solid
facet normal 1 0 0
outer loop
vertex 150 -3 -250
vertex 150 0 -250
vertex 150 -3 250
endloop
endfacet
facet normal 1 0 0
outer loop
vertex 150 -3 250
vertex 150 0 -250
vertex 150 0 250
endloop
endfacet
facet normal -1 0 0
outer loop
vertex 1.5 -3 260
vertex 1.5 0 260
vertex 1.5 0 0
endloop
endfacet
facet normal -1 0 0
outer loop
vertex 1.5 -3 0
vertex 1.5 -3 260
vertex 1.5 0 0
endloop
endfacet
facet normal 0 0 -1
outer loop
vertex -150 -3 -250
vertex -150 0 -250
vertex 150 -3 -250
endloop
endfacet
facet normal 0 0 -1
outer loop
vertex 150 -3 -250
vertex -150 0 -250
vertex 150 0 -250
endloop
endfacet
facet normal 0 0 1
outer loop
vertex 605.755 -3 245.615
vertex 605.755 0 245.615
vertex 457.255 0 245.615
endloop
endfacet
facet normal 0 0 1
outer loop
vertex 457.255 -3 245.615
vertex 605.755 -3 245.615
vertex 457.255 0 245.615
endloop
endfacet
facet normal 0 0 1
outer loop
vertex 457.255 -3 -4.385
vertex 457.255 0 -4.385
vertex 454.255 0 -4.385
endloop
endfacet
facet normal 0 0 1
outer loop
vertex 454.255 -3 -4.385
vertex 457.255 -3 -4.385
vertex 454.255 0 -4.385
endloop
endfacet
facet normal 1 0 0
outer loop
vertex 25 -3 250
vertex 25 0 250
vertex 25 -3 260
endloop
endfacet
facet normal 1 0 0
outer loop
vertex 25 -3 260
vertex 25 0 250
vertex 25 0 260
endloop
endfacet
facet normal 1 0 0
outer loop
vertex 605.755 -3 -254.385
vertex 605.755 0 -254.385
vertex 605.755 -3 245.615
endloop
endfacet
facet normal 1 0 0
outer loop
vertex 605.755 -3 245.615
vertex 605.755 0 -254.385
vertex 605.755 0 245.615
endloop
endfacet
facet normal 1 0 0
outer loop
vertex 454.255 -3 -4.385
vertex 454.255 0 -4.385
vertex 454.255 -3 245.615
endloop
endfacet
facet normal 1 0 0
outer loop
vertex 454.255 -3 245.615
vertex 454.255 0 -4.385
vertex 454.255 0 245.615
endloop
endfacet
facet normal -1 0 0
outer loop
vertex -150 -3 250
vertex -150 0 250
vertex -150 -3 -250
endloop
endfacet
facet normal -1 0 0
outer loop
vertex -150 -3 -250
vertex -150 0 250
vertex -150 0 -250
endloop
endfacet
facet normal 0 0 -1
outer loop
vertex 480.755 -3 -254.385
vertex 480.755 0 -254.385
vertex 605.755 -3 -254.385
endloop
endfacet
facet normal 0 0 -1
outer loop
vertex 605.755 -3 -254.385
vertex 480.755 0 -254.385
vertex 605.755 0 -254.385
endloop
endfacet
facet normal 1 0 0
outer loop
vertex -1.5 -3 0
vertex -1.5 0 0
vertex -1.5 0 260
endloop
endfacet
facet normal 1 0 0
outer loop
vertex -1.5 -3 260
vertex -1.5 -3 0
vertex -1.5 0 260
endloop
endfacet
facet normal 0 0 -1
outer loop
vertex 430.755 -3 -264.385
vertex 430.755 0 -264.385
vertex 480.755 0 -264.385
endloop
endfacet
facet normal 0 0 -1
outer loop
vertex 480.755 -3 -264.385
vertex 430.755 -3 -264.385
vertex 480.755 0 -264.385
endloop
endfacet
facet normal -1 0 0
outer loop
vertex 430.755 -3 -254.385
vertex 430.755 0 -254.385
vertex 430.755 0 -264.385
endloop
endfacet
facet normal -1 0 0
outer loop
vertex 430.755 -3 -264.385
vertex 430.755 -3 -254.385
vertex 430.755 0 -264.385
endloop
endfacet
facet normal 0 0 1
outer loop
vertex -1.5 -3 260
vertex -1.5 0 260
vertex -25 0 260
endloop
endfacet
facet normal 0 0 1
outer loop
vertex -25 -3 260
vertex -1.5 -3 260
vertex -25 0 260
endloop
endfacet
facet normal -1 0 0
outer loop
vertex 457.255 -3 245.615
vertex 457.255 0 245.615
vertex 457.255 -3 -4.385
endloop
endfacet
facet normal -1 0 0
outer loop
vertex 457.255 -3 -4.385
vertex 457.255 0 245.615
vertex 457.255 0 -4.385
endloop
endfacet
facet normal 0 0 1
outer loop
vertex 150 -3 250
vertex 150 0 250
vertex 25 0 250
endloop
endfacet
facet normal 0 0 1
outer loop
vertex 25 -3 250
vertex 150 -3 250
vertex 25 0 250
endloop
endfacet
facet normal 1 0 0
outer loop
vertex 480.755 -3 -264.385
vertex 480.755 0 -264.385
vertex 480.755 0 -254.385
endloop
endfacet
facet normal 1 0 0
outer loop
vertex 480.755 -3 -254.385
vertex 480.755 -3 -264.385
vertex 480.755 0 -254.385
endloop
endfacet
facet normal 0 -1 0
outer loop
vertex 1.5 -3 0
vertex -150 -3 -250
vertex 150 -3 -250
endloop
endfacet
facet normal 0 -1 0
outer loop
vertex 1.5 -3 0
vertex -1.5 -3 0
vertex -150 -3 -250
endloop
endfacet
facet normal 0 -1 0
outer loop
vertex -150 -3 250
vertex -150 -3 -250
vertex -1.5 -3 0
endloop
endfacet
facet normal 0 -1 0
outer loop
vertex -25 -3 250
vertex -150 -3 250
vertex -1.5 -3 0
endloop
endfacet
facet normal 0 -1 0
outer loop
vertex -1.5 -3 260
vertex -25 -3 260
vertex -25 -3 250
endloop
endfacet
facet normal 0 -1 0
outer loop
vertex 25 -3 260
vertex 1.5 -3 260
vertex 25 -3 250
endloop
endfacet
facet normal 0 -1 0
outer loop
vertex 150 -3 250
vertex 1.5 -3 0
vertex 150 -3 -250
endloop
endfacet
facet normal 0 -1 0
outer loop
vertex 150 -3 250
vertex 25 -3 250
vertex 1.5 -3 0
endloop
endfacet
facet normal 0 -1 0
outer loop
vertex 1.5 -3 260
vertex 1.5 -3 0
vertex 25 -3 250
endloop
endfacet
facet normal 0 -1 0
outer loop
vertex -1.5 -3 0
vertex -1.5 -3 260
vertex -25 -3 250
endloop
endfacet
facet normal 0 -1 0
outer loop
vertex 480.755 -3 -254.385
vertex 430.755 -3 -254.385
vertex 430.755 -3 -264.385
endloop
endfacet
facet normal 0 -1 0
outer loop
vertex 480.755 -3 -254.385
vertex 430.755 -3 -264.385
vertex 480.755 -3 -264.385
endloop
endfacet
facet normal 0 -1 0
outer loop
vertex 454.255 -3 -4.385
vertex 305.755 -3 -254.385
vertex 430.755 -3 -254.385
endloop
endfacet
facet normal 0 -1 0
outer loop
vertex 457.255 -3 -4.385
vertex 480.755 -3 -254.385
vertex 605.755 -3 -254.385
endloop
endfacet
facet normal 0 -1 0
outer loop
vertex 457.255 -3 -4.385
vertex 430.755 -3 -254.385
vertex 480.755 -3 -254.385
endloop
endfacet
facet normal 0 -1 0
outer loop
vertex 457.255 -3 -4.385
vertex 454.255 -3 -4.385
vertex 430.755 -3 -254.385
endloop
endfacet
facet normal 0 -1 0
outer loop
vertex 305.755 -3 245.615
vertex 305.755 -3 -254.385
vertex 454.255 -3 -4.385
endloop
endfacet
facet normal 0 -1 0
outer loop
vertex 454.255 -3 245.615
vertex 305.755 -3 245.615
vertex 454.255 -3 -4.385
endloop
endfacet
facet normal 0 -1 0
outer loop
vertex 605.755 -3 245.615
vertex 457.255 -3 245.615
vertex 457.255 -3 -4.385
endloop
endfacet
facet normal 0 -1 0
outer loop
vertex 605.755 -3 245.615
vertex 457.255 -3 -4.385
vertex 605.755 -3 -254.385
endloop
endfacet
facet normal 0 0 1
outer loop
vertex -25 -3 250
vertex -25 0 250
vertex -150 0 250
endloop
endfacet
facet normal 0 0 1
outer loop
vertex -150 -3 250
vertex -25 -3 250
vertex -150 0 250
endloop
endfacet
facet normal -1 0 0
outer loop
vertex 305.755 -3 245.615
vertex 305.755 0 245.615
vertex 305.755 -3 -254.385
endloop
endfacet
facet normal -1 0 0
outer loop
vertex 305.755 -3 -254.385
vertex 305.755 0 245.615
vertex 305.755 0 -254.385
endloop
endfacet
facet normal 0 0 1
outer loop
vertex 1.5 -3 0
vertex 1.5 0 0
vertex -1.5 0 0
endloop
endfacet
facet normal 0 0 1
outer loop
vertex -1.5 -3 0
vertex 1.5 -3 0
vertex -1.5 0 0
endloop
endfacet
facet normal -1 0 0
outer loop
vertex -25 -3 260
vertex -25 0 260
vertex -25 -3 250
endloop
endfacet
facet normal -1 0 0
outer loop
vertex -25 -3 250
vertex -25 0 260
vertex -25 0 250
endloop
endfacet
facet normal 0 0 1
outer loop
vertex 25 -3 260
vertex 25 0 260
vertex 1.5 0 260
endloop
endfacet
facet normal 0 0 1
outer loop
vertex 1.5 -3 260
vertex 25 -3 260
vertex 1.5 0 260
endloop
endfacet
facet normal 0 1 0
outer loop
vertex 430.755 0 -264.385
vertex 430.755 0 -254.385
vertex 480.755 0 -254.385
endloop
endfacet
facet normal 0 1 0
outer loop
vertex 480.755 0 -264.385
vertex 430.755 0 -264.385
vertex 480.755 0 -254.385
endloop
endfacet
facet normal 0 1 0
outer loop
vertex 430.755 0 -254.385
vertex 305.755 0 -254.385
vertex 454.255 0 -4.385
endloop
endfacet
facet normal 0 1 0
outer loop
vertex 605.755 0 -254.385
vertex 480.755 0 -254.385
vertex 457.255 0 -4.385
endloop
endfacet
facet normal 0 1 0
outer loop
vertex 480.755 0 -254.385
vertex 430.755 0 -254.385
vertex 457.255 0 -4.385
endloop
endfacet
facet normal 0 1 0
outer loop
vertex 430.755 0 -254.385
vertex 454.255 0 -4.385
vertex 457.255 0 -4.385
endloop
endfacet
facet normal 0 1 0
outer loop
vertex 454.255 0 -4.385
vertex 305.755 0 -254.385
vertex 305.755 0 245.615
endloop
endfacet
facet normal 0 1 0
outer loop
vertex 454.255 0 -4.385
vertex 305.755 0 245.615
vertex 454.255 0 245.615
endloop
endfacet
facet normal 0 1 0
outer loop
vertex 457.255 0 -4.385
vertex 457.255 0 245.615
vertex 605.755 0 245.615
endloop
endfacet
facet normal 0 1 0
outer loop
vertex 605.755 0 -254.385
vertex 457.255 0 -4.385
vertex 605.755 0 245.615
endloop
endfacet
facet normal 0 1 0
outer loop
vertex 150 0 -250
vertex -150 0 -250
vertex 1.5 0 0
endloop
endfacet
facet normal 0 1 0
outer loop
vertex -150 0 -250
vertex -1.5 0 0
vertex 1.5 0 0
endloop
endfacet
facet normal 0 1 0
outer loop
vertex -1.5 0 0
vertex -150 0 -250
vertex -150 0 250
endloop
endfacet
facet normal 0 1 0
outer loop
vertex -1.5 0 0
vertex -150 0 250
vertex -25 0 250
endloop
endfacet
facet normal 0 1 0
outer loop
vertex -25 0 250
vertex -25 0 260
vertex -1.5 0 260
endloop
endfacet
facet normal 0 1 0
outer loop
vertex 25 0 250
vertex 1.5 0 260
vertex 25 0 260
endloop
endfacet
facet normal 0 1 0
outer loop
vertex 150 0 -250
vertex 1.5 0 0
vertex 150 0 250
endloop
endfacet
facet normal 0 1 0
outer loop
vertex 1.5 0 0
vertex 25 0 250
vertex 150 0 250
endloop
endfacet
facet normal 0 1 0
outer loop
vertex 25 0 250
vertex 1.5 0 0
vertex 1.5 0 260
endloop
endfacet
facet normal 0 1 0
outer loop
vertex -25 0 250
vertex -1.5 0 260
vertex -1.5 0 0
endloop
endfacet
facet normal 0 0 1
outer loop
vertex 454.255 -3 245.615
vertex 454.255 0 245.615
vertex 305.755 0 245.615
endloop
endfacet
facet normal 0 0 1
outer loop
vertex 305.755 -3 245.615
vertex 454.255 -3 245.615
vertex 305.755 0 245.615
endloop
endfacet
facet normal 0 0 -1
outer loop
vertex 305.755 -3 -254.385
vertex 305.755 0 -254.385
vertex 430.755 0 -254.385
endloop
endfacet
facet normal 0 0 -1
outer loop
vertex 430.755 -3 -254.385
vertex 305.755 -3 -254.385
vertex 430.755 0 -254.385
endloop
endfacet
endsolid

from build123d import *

# Parameters (mm, degrees)
F1_DEPTH = 3


with BuildPart() as f1:
    # F0 (on Front) → F1 (new body)
    with BuildSketch(Plane.XZ):
        Polygon((-150, 250), (-150, -250), (150, -250), (150, 250), (25, 250), (25, 260), (1.5, 260), (1.5, 250), (1.5, 0), (-1.5, 0), (-1.5, 250), (-1.5, 260), (-25, 260), (-25, 250), align=None)
        Polygon((305.754572, 245.614678), (305.754572, -254.385322), (430.754572, -254.385322), (430.754572, -264.385322), (454.254572, -264.385322), (457.254572, -264.385322), (480.754572, -264.385322), (480.754572, -254.385322), (605.754572, -254.385322), (605.754572, 245.614678), (480.754572, 245.614678), (457.254572, 245.614678), (457.254572, -4.385322), (454.254572, -4.385322), (454.254572, 245.614678), (430.754572, 245.614678), align=None)
    extrude(amount=F1_DEPTH)


solid = f1.part
